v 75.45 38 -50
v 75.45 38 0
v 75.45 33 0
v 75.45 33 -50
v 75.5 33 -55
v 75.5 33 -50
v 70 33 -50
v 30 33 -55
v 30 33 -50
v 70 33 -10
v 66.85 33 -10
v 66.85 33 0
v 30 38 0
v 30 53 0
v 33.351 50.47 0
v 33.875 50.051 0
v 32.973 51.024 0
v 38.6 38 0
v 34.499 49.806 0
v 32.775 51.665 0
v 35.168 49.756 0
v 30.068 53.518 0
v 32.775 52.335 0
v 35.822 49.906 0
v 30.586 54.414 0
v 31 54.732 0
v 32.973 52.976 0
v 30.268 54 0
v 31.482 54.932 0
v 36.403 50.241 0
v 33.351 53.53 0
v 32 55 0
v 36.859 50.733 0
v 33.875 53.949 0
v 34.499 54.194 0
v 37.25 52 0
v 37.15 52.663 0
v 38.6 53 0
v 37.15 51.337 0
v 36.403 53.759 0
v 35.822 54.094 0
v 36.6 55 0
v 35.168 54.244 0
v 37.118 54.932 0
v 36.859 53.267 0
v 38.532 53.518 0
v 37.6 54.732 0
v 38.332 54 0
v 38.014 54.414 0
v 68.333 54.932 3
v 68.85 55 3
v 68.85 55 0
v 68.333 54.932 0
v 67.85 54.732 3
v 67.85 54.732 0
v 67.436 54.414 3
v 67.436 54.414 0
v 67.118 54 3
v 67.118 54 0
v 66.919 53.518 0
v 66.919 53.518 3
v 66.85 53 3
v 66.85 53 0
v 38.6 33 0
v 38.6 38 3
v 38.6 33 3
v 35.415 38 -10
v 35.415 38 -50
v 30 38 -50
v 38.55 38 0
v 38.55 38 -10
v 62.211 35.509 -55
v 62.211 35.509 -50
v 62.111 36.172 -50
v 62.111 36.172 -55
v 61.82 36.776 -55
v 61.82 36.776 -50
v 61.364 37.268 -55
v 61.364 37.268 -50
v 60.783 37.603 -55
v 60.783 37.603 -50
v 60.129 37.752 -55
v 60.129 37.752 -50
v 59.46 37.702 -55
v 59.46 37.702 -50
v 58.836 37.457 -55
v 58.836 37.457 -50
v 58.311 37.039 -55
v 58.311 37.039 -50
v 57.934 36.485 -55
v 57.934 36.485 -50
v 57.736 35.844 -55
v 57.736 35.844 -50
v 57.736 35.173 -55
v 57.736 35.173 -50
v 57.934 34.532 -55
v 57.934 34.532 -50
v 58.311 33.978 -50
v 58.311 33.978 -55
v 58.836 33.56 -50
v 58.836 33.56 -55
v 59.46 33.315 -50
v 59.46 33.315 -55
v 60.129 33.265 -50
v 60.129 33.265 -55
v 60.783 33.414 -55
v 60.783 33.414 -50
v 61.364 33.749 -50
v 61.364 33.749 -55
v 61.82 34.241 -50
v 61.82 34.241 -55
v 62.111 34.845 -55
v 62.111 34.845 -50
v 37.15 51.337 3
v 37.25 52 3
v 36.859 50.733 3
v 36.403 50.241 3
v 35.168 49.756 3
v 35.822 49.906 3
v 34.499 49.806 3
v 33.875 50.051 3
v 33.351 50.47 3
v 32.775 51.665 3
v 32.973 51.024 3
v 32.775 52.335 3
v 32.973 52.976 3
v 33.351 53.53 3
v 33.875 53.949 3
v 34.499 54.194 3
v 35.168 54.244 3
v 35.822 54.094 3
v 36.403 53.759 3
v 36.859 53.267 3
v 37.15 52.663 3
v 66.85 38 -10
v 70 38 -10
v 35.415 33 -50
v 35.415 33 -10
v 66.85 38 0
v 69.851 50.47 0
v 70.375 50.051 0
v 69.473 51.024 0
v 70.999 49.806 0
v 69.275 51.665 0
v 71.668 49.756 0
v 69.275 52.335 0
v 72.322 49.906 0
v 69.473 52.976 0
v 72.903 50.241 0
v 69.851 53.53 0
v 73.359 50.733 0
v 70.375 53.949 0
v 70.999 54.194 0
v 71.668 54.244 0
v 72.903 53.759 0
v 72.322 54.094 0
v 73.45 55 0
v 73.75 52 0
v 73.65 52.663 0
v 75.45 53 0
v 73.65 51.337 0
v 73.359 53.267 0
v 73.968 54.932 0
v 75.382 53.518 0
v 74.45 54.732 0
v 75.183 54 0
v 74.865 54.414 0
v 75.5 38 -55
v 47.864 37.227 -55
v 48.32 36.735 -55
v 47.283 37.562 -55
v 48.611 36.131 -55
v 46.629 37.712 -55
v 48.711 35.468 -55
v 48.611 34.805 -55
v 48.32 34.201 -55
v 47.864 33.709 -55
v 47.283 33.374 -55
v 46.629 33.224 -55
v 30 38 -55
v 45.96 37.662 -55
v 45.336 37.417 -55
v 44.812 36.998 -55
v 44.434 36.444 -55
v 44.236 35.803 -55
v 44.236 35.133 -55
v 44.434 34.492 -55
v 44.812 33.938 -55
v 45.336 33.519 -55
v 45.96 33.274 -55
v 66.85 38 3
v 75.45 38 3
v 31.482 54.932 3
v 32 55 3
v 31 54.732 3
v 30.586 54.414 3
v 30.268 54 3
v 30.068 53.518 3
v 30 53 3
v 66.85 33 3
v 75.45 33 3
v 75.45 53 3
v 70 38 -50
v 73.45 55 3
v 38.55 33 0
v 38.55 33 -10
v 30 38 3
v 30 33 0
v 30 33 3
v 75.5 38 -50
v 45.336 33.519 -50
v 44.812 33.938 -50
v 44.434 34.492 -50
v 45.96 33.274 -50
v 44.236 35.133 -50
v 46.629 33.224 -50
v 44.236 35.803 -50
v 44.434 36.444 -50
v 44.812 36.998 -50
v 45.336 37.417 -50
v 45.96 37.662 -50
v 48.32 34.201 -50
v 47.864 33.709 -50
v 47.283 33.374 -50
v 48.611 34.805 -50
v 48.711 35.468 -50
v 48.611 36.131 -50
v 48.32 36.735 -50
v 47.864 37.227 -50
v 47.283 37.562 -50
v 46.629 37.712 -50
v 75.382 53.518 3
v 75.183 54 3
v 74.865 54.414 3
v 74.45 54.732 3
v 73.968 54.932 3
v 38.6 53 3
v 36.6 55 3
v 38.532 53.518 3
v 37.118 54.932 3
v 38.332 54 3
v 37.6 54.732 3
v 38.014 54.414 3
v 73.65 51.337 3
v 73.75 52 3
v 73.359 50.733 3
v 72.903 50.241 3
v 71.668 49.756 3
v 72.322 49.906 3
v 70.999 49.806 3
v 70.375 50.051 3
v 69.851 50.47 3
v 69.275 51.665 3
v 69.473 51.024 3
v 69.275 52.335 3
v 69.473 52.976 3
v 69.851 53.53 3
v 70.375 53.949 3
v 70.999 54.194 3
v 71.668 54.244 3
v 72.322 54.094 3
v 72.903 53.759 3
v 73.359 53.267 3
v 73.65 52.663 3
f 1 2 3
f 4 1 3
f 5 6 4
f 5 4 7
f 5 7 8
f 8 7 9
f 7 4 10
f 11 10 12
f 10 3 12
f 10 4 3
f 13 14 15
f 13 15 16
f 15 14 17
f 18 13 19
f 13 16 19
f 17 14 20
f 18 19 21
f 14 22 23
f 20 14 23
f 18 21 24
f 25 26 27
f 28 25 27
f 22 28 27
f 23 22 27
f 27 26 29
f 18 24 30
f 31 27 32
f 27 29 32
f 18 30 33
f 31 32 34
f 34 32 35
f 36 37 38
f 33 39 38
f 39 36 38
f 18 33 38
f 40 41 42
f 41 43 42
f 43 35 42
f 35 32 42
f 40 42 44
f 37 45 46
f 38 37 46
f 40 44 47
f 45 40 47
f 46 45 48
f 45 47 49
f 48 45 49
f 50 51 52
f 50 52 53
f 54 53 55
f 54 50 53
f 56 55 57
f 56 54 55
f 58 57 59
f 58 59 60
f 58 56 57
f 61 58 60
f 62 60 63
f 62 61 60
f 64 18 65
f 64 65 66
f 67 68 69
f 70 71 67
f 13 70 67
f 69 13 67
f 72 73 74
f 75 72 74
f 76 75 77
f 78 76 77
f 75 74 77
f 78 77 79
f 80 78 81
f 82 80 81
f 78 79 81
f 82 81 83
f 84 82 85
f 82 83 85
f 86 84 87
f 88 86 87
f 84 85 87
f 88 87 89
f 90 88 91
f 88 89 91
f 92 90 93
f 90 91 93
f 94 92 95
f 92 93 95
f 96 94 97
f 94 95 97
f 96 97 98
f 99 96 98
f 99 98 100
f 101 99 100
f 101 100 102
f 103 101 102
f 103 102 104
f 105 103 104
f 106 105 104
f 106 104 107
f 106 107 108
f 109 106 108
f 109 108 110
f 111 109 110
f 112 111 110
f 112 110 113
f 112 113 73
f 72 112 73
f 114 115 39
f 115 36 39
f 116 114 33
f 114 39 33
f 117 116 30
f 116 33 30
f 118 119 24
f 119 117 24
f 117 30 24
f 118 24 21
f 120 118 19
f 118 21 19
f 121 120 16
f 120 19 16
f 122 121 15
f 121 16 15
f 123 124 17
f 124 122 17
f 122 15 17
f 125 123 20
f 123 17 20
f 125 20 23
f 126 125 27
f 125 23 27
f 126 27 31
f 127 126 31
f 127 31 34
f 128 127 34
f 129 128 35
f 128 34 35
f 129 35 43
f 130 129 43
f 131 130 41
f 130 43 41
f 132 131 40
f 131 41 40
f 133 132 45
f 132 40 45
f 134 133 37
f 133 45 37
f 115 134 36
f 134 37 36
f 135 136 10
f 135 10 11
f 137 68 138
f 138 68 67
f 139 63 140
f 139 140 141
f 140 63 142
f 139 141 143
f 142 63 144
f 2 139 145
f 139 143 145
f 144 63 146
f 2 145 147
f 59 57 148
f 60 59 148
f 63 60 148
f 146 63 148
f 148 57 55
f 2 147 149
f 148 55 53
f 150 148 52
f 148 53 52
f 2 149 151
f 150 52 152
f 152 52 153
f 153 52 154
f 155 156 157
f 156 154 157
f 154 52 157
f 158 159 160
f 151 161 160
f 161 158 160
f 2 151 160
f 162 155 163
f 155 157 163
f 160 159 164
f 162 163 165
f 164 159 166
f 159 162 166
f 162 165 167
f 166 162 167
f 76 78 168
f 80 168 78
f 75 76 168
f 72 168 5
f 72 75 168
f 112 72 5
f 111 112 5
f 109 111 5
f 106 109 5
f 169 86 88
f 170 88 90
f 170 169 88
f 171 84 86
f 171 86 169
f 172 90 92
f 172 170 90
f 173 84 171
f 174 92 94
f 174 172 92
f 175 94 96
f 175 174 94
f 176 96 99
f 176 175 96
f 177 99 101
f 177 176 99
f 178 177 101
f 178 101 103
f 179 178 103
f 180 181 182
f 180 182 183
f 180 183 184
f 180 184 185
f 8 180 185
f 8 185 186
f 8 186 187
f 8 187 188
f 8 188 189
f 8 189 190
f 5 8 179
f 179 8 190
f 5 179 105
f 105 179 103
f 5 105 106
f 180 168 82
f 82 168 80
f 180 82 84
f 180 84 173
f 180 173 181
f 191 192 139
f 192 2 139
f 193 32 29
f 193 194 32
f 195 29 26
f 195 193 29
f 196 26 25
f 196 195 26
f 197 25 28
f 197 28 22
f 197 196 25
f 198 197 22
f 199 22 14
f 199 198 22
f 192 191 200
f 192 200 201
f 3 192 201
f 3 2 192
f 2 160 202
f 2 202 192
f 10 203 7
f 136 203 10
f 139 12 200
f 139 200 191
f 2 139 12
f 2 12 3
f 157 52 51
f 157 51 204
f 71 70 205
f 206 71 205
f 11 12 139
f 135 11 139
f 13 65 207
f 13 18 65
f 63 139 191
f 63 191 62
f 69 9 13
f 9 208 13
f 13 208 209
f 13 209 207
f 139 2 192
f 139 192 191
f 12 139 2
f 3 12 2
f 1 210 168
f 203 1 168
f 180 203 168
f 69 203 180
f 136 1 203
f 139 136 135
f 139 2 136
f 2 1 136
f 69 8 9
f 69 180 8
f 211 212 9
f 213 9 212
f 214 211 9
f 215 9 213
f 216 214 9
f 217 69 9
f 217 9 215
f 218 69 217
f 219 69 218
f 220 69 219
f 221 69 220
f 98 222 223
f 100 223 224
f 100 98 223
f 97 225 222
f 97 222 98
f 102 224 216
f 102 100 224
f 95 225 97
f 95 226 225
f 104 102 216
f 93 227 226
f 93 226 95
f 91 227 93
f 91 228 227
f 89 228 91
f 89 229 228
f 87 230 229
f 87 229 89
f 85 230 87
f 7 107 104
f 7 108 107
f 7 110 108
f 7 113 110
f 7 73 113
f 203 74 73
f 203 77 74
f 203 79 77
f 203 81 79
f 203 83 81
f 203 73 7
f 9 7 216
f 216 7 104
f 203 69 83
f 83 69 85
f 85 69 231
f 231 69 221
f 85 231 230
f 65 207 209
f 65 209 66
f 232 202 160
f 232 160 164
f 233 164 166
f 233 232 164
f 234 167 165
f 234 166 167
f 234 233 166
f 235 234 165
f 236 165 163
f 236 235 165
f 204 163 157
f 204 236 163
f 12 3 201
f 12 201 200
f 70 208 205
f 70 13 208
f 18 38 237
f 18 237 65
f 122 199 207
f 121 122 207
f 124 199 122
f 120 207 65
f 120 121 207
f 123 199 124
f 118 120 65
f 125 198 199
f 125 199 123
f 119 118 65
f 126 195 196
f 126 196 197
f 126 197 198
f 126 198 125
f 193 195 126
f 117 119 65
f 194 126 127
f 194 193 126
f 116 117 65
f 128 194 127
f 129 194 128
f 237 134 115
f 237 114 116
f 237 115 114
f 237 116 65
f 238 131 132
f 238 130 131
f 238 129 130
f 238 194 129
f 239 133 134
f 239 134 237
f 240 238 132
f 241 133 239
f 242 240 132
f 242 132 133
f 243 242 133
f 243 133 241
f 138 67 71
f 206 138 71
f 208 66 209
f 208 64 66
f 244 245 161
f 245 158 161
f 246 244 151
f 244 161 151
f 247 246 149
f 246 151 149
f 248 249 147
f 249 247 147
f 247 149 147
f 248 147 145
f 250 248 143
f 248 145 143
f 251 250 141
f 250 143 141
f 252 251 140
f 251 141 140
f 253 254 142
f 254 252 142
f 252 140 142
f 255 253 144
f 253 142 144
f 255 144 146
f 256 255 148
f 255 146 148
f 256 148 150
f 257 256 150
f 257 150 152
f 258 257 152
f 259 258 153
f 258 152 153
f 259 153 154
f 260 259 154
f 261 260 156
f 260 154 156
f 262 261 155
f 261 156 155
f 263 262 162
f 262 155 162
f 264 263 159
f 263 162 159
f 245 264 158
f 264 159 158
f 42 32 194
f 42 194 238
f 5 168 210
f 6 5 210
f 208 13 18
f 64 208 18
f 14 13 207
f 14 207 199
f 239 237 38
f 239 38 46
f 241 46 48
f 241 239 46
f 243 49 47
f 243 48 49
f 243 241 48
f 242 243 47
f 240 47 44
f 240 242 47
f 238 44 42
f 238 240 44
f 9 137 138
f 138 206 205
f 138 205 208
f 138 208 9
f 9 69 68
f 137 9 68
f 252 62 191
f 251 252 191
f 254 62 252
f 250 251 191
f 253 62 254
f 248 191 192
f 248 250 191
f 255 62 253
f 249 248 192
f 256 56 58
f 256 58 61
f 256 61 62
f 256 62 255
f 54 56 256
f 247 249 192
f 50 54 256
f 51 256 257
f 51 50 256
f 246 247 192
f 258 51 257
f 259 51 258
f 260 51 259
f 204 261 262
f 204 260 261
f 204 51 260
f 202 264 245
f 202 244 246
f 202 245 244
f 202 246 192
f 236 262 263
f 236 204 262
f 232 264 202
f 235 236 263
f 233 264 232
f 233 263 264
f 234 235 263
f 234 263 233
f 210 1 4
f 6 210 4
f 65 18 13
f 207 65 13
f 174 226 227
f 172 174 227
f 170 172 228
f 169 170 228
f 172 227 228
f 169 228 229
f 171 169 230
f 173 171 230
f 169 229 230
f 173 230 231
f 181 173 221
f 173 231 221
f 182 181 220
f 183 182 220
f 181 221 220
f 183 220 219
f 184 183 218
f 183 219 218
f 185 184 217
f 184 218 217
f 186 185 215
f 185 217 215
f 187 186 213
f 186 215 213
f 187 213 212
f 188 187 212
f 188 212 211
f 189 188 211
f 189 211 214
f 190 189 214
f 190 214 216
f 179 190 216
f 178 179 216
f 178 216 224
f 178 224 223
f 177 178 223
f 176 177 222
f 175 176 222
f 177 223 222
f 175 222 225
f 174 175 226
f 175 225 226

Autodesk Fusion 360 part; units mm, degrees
sketch "Sketch1" plane through (0, 0, 0) normal (0, 0, 1) x (1, 0, 0)
  circle A0 centre (35, 52) radius 2.25
  circle A1 centre (71.5, 52) radius 2.25
  line L0 (30, 55) -> (38.6, 55)
  line L1 (38.6, 55) -> (38.6, 33)
  line L2 (38.6, 33) -> (30, 33)
  line L3 (30, 33) -> (30, 55)
  line L4 (66.8505, 55) -> (75.4505, 55)
  line L5 (75.4505, 55) -> (75.4505, 33)
  line L6 (75.4505, 33) -> (66.8505, 33)
  line L7 (66.8505, 33) -> (66.8505, 55)
  line L8 (30, 33) -> (38.6, 33)
  line L9 (38.6, 33) -> (38.6, 38)
  line L10 (38.6, 38) -> (30, 38)
  line L11 (30, 38) -> (30, 33)
  line L12 (66.8505, 33) -> (75.4505, 33)
  line L13 (75.4505, 33) -> (75.4505, 38)
  line L14 (75.4505, 38) -> (66.8505, 38)
  line L15 (66.8505, 38) -> (66.8505, 33)
  dimension "d1" = 4.5
  dimension "d2" = 4.5
  dimension "d3" = 36.5
  dimension "d4" = 22
  dimension "d5" = 3
  dimension "d7" = 22
  dimension "d8" = 8.6
  dimension "d9" = 3
  dimension "d10" = 5
  dimension "d11" = 5
extrude "Extrude1" add sketch "Sketch1" along normal blind 3 contours L0 L1 L3 L10 | L4 L5 L7 L14 makes body 1 at (71.2109, 41.9188, 0) makes body 2 at (34.4773, 41.9188, 0)
extrude "Extrude2" add sketch "Sketch1" against normal blind 50 separate body contours L1 L2 L3 L8 L9 L10 L11 | L5 L6 L7 L12 L13 L14 L15 makes body 3 at (35.7333, 38, -33.3333) makes body 4 at (72.5838, 38, -16.6667)
extrude "Extrude3" add sketch "Sketch1" along normal blind 3 separate body contours L1 L2 L3 L8 L9 L10 L11 | L5 L6 L7 L12 L13 L14 L15 makes body 5 at (32.8667, 36.3333, 0) makes body 6 at (69.7172, 36.3333, 0)
sketch "Sketch2" plane through (30, 0, 0) normal (-1, 0, 0) x (0, 0, 1)
  line L0 (0, 33) -> (0, 38)
  line L1 (0, 38) -> (-50, 38)
  line L2 (-50, 38) -> (-50, 33)
  line L3 (-50, 33) -> (0, 33)
  line L4 (-50, 38) -> (-55, 38)
  line L5 (-55, 38) -> (-55, 33)
  line L6 (-55, 33) -> (-50, 33)
  line L7 (-50, 33) -> (-50, 38)
  dimension "d18" = 5
extrude "Extrude4" add sketch "Sketch2" against normal blind 45 separate body contours L2 L4 L5 L6 L7 makes body 7
sketch "Sketch3" plane through (0, 0, -50) normal (0, 0, 1) x (1, 0, 0)
  line L0 (30, 38) -> (30, 33)
  line L1 (30, 33) -> (75, 33)
  line L2 (75, 33) -> (75, 38)
  line L3 (75, 38) -> (30, 38)
  circle A0 centre (46.4611, 35.468) radius 2.25
  circle A1 centre (59.9608, 35.5086) radius 2.25
  dimension "d21" = 4.5
  dimension "d22" = 4.5
extrude "Extrude5" cut sketch "Sketch3" against normal blind 5 contours A0 | A1 bodies 7
fillet "Fillet1" radius 2 4 edges at (75.4505, 55, 1.5) (66.8505, 55, 1.5) (38.6, 55, 1.5) (30, 55, 1.5) on bodies 1 2
extrude "Extrude6" add 1 faces at (75, 34.6667, -51.6667) along direction (1, 0, 0) blind 0.5 on bodies 7 bodies 7 6 4
sketch "Sketch4" plane through (0, 38, 0) normal (0, 1, 0) x (-1, 0, 0)
  line L0 (-30, -55) -> (-30, -50)
  line L1 (-30, -50) -> (-66.8505, -50)
  line L2 (-66.8505, -50) -> (-66.8505, 0)
  line L3 (-66.8505, 0) -> (-75.4505, 0)
  line L4 (-75.4505, 0) -> (-75.4505, -50)
  line L5 (-75.4505, -50) -> (-75.5, -50)
  line L6 (-75.5, -50) -> (-75.5, -55)
  line L7 (-75.5, -55) -> (-30, -55)
  line L8 (-66.8505, -50) -> (-70, -50)
  line L9 (-70, -50) -> (-70, -10)
  line L10 (-70, -10) -> (-66.8505, -10)
  line L11 (-66.8505, -10) -> (-66.8505, -50)
  line L12 (-38.5651, -50) -> (-35.4151, -50)
  line L13 (-35.4151, -50) -> (-35.4151, -10)
  line L14 (-35.4151, -10) -> (-38.5651, -10)
  line L15 (-38.5651, -10) -> (-38.5651, -50)
  dimension "d28" = 3.15
  dimension "d29" = 40
extrude "Extrude7" cut sketch "Sketch4" against normal blind 10 contours L1 L12 L13 L14 L15 | L2 L8 L9 L10 L11 bodies 3 7
extrude "Extrude8" cut 1 faces at (38.6, 36.3333, -16.6667) along direction (-1, 0, 0) blind 0.05 on bodies 3 bodies 3
